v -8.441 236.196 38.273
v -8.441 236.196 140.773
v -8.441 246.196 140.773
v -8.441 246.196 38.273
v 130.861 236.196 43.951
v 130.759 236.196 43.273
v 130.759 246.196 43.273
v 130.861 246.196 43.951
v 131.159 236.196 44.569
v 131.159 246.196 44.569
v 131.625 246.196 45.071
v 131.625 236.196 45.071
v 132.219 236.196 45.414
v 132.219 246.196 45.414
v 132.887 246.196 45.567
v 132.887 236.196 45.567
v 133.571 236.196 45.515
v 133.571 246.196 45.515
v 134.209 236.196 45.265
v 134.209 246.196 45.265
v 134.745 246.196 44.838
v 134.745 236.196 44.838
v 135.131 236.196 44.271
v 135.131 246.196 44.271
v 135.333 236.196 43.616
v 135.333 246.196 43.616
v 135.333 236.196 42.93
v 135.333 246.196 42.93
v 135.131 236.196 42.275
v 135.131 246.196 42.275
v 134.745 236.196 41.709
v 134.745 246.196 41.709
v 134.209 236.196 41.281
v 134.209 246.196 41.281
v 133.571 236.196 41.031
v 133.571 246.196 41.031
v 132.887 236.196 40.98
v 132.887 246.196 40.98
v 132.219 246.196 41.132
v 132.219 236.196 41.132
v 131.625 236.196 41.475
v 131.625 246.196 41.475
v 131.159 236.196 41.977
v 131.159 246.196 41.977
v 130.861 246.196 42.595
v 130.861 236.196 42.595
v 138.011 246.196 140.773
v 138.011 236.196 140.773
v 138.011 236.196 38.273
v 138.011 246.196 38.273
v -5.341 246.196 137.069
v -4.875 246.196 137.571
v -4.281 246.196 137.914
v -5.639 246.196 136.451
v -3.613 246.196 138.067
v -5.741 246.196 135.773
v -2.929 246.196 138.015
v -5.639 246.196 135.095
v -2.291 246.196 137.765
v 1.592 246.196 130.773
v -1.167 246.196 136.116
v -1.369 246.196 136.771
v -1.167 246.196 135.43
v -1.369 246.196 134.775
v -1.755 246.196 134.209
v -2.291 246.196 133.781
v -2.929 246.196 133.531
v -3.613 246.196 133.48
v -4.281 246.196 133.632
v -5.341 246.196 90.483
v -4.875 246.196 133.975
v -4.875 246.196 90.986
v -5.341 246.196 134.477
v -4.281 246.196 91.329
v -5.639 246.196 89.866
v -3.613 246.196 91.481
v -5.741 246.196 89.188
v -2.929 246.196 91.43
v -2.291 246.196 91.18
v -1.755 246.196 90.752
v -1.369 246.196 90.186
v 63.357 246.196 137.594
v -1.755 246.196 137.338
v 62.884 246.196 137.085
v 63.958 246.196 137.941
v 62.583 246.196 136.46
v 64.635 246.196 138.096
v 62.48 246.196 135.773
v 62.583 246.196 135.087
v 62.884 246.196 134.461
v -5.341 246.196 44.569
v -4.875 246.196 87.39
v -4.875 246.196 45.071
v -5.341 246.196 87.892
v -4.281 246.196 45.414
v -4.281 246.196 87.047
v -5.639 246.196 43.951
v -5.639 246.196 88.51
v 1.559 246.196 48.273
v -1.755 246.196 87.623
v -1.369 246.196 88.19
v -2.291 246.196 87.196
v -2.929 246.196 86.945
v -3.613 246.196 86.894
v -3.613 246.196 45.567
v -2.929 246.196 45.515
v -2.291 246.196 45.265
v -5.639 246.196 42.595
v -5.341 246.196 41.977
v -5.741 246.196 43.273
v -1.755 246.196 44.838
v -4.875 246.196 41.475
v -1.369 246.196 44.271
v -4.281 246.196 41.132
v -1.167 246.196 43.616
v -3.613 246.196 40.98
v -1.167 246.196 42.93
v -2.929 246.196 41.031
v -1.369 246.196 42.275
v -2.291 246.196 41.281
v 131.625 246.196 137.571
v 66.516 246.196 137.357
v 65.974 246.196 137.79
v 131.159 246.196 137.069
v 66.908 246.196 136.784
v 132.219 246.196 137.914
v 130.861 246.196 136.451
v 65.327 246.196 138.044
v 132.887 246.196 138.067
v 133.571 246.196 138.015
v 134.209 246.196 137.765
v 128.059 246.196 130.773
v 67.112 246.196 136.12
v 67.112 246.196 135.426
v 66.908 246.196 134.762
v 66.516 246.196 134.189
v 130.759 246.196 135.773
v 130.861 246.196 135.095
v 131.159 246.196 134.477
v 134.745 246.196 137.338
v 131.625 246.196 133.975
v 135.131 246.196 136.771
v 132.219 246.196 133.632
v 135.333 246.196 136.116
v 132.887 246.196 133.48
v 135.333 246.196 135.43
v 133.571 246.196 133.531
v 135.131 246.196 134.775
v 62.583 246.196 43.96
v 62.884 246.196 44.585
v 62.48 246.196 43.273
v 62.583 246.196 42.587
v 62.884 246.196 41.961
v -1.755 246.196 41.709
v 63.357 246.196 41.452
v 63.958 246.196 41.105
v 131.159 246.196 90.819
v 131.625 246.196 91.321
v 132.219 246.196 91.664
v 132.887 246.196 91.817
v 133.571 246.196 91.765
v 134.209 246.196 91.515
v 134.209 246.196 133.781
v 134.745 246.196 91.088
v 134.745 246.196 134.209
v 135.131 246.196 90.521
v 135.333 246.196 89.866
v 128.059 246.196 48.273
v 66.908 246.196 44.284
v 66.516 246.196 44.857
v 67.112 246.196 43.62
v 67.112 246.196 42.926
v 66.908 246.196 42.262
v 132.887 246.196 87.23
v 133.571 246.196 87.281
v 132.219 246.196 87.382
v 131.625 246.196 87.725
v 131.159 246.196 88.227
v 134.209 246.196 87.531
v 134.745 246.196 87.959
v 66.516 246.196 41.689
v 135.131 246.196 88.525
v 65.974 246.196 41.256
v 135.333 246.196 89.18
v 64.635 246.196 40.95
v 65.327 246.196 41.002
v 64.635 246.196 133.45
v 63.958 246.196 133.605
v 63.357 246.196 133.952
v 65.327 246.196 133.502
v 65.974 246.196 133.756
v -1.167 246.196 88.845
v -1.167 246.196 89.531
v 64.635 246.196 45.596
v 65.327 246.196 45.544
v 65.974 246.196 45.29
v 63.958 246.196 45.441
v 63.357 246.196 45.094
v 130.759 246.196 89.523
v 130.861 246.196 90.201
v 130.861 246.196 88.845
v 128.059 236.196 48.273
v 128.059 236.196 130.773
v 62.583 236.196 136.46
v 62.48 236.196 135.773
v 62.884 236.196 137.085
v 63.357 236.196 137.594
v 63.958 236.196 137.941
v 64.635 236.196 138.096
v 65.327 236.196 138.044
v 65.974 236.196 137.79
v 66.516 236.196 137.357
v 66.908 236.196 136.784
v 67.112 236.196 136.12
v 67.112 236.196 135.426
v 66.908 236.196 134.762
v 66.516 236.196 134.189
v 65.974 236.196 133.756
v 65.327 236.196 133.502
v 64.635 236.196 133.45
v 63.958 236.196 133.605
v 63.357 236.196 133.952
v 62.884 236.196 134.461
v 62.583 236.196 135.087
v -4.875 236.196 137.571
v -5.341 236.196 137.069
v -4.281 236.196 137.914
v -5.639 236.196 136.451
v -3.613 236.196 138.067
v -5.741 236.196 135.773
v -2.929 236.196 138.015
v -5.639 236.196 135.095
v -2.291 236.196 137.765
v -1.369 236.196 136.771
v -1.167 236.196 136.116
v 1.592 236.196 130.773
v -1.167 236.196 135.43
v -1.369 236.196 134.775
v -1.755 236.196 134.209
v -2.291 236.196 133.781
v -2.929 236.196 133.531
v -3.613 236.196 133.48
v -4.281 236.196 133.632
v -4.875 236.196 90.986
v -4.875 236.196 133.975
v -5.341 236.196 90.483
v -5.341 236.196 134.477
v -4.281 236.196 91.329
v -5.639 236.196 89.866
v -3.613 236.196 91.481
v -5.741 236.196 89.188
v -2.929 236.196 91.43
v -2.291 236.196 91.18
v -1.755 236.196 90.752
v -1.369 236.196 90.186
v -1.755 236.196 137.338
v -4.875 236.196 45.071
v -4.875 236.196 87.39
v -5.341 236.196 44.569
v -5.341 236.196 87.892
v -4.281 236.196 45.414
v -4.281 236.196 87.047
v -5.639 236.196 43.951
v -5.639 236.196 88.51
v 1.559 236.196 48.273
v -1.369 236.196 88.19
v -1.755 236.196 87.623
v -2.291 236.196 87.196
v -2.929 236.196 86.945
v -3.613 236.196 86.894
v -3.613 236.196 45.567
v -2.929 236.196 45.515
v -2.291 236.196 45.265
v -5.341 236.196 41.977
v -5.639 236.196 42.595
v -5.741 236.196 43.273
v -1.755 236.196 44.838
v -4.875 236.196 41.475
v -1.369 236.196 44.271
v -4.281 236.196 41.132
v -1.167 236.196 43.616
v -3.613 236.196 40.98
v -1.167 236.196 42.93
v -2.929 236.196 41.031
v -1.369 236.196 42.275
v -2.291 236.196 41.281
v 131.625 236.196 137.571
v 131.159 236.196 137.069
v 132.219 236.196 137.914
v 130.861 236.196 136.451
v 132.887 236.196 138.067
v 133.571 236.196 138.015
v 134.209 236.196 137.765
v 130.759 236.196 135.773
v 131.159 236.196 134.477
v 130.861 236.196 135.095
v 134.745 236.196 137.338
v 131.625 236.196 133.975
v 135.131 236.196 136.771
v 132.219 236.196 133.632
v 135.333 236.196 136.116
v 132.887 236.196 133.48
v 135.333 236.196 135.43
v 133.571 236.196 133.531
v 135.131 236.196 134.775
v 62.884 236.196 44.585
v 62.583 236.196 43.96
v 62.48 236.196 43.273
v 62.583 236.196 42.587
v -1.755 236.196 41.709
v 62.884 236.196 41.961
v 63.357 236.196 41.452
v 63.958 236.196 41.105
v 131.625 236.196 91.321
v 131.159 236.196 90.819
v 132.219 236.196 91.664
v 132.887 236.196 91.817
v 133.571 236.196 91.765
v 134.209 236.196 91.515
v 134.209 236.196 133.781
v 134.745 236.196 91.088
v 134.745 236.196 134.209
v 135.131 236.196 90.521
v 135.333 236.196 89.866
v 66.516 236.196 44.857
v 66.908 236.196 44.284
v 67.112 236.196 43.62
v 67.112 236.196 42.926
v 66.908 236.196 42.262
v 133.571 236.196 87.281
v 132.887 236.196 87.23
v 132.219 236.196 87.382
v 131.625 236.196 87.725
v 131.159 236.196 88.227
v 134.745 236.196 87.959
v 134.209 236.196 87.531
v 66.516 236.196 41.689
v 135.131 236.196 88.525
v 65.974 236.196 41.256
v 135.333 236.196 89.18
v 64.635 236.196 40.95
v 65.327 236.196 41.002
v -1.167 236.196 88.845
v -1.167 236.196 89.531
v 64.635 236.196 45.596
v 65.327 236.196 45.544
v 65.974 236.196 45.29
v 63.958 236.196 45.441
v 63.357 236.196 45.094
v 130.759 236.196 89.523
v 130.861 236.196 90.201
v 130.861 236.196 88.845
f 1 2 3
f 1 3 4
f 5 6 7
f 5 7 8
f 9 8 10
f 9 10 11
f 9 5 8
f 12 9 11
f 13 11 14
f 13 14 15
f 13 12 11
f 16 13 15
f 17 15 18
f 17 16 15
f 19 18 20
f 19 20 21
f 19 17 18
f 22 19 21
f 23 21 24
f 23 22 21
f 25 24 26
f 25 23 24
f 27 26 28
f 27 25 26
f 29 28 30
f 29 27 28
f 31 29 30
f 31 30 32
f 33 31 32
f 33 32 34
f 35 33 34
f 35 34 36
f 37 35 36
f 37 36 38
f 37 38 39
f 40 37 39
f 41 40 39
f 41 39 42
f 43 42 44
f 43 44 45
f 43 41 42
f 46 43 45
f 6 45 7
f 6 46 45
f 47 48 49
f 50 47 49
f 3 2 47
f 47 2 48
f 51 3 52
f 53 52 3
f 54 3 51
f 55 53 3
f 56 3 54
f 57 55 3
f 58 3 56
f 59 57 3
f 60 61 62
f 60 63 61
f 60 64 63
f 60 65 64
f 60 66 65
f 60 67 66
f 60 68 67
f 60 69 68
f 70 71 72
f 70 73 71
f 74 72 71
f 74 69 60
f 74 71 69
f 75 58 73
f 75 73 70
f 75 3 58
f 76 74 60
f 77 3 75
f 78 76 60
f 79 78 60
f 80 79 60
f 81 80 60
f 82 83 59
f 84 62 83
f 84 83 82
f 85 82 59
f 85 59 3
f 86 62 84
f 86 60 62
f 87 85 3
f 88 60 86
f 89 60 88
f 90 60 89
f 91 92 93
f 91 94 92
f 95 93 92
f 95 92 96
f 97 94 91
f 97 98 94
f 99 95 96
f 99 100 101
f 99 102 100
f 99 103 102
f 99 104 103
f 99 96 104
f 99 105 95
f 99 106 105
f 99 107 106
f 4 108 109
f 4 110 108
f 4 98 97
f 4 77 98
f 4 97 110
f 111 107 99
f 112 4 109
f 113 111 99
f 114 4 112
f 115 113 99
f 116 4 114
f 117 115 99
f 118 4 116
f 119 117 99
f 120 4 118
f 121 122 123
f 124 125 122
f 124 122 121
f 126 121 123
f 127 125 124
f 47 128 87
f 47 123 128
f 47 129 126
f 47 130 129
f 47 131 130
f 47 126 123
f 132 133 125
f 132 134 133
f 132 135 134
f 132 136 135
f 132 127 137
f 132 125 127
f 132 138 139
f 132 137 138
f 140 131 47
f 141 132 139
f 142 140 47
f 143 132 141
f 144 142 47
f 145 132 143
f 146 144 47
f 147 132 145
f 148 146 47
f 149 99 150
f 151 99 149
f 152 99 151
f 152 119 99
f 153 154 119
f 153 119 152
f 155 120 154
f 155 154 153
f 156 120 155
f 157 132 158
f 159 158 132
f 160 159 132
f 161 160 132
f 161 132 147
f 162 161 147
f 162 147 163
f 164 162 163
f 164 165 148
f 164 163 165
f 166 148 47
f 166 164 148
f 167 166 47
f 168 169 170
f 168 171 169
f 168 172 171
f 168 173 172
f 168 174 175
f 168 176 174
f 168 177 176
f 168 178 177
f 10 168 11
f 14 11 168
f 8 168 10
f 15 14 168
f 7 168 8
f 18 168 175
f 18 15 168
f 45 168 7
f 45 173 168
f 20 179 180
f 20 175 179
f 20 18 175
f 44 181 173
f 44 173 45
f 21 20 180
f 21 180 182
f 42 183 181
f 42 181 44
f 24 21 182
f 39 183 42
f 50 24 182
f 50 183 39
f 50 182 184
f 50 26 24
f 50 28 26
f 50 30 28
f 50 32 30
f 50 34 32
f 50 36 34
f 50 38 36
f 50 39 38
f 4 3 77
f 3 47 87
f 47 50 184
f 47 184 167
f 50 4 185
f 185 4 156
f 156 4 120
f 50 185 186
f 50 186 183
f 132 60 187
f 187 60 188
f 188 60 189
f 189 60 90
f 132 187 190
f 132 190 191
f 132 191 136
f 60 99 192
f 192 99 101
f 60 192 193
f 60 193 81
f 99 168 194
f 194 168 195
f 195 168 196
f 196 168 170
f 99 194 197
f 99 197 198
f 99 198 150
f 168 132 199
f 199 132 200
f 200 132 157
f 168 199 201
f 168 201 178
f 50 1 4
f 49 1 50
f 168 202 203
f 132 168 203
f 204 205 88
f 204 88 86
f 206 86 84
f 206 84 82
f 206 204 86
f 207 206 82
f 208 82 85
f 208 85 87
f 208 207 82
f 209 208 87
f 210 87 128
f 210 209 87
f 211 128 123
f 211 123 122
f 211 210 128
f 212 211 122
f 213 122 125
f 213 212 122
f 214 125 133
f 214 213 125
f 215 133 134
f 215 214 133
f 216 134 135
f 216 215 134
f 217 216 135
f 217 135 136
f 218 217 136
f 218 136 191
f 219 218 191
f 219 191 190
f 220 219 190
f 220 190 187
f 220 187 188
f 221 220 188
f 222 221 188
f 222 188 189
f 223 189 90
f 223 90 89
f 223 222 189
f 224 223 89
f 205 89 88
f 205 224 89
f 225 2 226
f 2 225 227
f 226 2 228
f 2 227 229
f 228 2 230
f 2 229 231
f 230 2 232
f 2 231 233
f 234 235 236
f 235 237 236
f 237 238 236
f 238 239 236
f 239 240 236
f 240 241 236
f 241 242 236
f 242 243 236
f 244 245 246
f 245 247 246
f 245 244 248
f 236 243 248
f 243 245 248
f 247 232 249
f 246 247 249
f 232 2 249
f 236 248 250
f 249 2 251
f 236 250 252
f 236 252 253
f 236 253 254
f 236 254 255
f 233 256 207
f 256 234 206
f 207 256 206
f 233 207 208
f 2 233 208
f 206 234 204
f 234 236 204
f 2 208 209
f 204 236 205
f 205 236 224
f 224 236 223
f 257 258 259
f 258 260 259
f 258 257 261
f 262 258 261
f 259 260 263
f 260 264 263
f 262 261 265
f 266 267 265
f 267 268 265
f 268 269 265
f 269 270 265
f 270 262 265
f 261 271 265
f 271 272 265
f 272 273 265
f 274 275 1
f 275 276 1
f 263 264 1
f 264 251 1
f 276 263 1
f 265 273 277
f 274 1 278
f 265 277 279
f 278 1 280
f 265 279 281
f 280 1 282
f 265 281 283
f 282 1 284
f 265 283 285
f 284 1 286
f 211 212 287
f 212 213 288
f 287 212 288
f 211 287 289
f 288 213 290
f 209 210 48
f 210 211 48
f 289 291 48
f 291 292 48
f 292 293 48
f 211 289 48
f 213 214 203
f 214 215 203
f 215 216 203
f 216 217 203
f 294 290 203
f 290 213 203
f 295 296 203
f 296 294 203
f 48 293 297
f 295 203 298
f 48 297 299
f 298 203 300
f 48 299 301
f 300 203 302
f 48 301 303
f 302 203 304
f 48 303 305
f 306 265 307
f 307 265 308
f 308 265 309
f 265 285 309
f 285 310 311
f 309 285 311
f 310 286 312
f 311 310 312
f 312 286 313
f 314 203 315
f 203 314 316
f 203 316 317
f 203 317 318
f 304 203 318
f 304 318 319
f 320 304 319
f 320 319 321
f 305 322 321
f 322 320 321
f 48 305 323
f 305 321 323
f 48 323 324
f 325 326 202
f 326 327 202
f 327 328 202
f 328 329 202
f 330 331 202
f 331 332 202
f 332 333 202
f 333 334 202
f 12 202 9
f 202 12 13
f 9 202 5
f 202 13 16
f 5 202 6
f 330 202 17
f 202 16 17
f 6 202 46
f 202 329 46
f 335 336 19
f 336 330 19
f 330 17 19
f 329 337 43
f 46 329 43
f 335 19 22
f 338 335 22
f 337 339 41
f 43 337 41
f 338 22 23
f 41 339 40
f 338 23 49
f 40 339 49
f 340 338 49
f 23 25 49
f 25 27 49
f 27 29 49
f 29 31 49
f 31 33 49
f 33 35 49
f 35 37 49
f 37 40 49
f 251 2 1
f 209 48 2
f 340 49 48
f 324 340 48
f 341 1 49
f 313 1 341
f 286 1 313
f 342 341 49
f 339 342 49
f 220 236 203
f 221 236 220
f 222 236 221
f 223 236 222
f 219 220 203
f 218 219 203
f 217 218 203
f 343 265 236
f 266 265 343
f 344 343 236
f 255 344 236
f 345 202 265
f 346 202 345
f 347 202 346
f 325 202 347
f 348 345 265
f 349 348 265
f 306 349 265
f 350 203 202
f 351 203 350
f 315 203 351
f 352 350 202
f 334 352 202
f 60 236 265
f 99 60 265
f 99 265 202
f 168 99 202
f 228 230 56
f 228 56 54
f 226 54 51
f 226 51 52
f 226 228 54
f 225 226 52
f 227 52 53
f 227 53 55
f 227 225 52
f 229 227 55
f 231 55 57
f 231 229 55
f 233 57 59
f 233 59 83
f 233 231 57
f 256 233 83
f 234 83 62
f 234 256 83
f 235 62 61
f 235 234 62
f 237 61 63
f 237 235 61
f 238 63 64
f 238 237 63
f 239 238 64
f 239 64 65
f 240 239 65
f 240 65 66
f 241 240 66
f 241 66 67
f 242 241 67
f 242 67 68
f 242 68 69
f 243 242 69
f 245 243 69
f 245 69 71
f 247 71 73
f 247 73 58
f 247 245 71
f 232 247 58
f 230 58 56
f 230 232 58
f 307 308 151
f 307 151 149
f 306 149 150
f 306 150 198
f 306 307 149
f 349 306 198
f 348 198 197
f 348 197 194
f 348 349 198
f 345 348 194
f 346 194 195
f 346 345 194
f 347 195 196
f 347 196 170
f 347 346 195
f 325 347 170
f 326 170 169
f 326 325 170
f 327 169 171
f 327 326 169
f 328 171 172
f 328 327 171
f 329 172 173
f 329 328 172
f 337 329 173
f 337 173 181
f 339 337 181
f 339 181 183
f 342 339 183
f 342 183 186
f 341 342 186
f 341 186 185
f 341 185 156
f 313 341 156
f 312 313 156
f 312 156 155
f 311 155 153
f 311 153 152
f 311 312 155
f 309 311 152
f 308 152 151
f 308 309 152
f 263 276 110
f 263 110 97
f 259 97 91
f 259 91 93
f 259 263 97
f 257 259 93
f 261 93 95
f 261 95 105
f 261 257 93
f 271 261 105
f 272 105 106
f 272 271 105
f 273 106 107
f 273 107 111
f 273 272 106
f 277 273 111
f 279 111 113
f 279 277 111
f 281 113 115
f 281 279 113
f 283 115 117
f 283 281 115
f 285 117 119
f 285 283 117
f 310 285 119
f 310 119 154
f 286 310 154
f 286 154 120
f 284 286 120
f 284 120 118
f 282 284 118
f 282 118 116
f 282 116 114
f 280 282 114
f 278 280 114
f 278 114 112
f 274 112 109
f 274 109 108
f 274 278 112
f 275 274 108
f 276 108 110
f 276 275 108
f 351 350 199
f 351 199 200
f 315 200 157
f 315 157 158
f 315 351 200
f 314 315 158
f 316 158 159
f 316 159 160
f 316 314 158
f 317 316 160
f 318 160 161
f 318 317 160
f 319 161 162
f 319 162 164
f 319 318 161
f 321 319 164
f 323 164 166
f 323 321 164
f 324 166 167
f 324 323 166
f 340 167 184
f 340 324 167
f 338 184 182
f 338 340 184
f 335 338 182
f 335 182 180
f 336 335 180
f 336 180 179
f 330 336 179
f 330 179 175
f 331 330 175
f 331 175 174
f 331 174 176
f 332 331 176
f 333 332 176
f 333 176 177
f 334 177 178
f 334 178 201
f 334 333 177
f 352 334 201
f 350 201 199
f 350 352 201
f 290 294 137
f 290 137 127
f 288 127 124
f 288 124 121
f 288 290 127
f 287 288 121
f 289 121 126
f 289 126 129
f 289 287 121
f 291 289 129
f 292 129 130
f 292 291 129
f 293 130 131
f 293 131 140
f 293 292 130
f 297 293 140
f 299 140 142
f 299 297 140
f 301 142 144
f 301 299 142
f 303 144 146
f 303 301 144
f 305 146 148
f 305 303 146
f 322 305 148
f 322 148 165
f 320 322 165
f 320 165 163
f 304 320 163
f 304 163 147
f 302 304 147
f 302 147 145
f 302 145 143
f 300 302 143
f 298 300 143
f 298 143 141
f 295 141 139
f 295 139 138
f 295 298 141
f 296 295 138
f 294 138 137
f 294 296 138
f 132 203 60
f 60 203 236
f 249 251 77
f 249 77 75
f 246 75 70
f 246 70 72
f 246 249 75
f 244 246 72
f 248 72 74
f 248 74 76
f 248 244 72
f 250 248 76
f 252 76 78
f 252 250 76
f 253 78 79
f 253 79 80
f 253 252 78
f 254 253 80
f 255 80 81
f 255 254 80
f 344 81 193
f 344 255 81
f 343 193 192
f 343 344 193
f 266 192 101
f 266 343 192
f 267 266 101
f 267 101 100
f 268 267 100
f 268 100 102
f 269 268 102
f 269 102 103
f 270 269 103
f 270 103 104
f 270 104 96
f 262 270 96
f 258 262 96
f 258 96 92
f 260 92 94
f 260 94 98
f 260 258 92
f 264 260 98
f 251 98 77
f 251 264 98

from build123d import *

# Parameters (mm, degrees)
SKETCH_1_W      = 146.451560669
SKETCH_1_H      = 102.5
SKETCH_1_R      = 2.329290182
SKETCH_1_R_2    = 2.3
EXTRUDE_1_DEPTH = 10


with BuildPart() as part:
    # Эскиз1 → Бобышка-Вытянуть1 (new body)
    with BuildSketch(Plane(origin=(0, 236.195974268, 0), x_dir=(1, 0, 0), z_dir=(0, 1, 0))):
        with Locations((64.784761029, -89.523129836)):
            Rectangle(SKETCH_1_W, SKETCH_1_H)
        with Locations(Location((64.808980694, -43.273129836, 0), (0, 0, 180))):
            Circle(SKETCH_1_R, mode=Mode.SUBTRACT)
        with Locations(Location((-3.441019306, -89.187817333, 0), (0, 0, 180))):
            Circle(SKETCH_1_R_2, mode=Mode.SUBTRACT)
        with Locations(Location((64.808980694, -135.773129836, 0), (0, 0, 180))):
            Circle(SKETCH_1_R, mode=Mode.SUBTRACT)
        with Locations(Location((133.058980694, -89.523129836, 0), (0, 0, 180))):
            Circle(SKETCH_1_R_2, mode=Mode.SUBTRACT)
        with Locations(Location((-3.441019306, -43.273129836, 0), (0, 0, 180))):
            Circle(SKETCH_1_R_2, mode=Mode.SUBTRACT)
        with Locations(Location((133.058980694, -43.273129836, 0), (0, 0, 180))):
            Circle(SKETCH_1_R_2, mode=Mode.SUBTRACT)
        with Locations(Location((133.058980694, -135.773129836, 0), (0, 0, 180))):
            Circle(SKETCH_1_R_2, mode=Mode.SUBTRACT)
        with Locations(Location((-3.441019306, -135.773129836, 0), (0, 0, 180))):
            Circle(SKETCH_1_R_2, mode=Mode.SUBTRACT)
        Polygon((1.591962046, -130.773129836), (1.558980694, -48.273129836), (128.058980694, -48.273129836), (128.058980694, -130.773129836), align=None, mode=Mode.SUBTRACT)
    extrude(amount=EXTRUDE_1_DEPTH)


solid = part.part
